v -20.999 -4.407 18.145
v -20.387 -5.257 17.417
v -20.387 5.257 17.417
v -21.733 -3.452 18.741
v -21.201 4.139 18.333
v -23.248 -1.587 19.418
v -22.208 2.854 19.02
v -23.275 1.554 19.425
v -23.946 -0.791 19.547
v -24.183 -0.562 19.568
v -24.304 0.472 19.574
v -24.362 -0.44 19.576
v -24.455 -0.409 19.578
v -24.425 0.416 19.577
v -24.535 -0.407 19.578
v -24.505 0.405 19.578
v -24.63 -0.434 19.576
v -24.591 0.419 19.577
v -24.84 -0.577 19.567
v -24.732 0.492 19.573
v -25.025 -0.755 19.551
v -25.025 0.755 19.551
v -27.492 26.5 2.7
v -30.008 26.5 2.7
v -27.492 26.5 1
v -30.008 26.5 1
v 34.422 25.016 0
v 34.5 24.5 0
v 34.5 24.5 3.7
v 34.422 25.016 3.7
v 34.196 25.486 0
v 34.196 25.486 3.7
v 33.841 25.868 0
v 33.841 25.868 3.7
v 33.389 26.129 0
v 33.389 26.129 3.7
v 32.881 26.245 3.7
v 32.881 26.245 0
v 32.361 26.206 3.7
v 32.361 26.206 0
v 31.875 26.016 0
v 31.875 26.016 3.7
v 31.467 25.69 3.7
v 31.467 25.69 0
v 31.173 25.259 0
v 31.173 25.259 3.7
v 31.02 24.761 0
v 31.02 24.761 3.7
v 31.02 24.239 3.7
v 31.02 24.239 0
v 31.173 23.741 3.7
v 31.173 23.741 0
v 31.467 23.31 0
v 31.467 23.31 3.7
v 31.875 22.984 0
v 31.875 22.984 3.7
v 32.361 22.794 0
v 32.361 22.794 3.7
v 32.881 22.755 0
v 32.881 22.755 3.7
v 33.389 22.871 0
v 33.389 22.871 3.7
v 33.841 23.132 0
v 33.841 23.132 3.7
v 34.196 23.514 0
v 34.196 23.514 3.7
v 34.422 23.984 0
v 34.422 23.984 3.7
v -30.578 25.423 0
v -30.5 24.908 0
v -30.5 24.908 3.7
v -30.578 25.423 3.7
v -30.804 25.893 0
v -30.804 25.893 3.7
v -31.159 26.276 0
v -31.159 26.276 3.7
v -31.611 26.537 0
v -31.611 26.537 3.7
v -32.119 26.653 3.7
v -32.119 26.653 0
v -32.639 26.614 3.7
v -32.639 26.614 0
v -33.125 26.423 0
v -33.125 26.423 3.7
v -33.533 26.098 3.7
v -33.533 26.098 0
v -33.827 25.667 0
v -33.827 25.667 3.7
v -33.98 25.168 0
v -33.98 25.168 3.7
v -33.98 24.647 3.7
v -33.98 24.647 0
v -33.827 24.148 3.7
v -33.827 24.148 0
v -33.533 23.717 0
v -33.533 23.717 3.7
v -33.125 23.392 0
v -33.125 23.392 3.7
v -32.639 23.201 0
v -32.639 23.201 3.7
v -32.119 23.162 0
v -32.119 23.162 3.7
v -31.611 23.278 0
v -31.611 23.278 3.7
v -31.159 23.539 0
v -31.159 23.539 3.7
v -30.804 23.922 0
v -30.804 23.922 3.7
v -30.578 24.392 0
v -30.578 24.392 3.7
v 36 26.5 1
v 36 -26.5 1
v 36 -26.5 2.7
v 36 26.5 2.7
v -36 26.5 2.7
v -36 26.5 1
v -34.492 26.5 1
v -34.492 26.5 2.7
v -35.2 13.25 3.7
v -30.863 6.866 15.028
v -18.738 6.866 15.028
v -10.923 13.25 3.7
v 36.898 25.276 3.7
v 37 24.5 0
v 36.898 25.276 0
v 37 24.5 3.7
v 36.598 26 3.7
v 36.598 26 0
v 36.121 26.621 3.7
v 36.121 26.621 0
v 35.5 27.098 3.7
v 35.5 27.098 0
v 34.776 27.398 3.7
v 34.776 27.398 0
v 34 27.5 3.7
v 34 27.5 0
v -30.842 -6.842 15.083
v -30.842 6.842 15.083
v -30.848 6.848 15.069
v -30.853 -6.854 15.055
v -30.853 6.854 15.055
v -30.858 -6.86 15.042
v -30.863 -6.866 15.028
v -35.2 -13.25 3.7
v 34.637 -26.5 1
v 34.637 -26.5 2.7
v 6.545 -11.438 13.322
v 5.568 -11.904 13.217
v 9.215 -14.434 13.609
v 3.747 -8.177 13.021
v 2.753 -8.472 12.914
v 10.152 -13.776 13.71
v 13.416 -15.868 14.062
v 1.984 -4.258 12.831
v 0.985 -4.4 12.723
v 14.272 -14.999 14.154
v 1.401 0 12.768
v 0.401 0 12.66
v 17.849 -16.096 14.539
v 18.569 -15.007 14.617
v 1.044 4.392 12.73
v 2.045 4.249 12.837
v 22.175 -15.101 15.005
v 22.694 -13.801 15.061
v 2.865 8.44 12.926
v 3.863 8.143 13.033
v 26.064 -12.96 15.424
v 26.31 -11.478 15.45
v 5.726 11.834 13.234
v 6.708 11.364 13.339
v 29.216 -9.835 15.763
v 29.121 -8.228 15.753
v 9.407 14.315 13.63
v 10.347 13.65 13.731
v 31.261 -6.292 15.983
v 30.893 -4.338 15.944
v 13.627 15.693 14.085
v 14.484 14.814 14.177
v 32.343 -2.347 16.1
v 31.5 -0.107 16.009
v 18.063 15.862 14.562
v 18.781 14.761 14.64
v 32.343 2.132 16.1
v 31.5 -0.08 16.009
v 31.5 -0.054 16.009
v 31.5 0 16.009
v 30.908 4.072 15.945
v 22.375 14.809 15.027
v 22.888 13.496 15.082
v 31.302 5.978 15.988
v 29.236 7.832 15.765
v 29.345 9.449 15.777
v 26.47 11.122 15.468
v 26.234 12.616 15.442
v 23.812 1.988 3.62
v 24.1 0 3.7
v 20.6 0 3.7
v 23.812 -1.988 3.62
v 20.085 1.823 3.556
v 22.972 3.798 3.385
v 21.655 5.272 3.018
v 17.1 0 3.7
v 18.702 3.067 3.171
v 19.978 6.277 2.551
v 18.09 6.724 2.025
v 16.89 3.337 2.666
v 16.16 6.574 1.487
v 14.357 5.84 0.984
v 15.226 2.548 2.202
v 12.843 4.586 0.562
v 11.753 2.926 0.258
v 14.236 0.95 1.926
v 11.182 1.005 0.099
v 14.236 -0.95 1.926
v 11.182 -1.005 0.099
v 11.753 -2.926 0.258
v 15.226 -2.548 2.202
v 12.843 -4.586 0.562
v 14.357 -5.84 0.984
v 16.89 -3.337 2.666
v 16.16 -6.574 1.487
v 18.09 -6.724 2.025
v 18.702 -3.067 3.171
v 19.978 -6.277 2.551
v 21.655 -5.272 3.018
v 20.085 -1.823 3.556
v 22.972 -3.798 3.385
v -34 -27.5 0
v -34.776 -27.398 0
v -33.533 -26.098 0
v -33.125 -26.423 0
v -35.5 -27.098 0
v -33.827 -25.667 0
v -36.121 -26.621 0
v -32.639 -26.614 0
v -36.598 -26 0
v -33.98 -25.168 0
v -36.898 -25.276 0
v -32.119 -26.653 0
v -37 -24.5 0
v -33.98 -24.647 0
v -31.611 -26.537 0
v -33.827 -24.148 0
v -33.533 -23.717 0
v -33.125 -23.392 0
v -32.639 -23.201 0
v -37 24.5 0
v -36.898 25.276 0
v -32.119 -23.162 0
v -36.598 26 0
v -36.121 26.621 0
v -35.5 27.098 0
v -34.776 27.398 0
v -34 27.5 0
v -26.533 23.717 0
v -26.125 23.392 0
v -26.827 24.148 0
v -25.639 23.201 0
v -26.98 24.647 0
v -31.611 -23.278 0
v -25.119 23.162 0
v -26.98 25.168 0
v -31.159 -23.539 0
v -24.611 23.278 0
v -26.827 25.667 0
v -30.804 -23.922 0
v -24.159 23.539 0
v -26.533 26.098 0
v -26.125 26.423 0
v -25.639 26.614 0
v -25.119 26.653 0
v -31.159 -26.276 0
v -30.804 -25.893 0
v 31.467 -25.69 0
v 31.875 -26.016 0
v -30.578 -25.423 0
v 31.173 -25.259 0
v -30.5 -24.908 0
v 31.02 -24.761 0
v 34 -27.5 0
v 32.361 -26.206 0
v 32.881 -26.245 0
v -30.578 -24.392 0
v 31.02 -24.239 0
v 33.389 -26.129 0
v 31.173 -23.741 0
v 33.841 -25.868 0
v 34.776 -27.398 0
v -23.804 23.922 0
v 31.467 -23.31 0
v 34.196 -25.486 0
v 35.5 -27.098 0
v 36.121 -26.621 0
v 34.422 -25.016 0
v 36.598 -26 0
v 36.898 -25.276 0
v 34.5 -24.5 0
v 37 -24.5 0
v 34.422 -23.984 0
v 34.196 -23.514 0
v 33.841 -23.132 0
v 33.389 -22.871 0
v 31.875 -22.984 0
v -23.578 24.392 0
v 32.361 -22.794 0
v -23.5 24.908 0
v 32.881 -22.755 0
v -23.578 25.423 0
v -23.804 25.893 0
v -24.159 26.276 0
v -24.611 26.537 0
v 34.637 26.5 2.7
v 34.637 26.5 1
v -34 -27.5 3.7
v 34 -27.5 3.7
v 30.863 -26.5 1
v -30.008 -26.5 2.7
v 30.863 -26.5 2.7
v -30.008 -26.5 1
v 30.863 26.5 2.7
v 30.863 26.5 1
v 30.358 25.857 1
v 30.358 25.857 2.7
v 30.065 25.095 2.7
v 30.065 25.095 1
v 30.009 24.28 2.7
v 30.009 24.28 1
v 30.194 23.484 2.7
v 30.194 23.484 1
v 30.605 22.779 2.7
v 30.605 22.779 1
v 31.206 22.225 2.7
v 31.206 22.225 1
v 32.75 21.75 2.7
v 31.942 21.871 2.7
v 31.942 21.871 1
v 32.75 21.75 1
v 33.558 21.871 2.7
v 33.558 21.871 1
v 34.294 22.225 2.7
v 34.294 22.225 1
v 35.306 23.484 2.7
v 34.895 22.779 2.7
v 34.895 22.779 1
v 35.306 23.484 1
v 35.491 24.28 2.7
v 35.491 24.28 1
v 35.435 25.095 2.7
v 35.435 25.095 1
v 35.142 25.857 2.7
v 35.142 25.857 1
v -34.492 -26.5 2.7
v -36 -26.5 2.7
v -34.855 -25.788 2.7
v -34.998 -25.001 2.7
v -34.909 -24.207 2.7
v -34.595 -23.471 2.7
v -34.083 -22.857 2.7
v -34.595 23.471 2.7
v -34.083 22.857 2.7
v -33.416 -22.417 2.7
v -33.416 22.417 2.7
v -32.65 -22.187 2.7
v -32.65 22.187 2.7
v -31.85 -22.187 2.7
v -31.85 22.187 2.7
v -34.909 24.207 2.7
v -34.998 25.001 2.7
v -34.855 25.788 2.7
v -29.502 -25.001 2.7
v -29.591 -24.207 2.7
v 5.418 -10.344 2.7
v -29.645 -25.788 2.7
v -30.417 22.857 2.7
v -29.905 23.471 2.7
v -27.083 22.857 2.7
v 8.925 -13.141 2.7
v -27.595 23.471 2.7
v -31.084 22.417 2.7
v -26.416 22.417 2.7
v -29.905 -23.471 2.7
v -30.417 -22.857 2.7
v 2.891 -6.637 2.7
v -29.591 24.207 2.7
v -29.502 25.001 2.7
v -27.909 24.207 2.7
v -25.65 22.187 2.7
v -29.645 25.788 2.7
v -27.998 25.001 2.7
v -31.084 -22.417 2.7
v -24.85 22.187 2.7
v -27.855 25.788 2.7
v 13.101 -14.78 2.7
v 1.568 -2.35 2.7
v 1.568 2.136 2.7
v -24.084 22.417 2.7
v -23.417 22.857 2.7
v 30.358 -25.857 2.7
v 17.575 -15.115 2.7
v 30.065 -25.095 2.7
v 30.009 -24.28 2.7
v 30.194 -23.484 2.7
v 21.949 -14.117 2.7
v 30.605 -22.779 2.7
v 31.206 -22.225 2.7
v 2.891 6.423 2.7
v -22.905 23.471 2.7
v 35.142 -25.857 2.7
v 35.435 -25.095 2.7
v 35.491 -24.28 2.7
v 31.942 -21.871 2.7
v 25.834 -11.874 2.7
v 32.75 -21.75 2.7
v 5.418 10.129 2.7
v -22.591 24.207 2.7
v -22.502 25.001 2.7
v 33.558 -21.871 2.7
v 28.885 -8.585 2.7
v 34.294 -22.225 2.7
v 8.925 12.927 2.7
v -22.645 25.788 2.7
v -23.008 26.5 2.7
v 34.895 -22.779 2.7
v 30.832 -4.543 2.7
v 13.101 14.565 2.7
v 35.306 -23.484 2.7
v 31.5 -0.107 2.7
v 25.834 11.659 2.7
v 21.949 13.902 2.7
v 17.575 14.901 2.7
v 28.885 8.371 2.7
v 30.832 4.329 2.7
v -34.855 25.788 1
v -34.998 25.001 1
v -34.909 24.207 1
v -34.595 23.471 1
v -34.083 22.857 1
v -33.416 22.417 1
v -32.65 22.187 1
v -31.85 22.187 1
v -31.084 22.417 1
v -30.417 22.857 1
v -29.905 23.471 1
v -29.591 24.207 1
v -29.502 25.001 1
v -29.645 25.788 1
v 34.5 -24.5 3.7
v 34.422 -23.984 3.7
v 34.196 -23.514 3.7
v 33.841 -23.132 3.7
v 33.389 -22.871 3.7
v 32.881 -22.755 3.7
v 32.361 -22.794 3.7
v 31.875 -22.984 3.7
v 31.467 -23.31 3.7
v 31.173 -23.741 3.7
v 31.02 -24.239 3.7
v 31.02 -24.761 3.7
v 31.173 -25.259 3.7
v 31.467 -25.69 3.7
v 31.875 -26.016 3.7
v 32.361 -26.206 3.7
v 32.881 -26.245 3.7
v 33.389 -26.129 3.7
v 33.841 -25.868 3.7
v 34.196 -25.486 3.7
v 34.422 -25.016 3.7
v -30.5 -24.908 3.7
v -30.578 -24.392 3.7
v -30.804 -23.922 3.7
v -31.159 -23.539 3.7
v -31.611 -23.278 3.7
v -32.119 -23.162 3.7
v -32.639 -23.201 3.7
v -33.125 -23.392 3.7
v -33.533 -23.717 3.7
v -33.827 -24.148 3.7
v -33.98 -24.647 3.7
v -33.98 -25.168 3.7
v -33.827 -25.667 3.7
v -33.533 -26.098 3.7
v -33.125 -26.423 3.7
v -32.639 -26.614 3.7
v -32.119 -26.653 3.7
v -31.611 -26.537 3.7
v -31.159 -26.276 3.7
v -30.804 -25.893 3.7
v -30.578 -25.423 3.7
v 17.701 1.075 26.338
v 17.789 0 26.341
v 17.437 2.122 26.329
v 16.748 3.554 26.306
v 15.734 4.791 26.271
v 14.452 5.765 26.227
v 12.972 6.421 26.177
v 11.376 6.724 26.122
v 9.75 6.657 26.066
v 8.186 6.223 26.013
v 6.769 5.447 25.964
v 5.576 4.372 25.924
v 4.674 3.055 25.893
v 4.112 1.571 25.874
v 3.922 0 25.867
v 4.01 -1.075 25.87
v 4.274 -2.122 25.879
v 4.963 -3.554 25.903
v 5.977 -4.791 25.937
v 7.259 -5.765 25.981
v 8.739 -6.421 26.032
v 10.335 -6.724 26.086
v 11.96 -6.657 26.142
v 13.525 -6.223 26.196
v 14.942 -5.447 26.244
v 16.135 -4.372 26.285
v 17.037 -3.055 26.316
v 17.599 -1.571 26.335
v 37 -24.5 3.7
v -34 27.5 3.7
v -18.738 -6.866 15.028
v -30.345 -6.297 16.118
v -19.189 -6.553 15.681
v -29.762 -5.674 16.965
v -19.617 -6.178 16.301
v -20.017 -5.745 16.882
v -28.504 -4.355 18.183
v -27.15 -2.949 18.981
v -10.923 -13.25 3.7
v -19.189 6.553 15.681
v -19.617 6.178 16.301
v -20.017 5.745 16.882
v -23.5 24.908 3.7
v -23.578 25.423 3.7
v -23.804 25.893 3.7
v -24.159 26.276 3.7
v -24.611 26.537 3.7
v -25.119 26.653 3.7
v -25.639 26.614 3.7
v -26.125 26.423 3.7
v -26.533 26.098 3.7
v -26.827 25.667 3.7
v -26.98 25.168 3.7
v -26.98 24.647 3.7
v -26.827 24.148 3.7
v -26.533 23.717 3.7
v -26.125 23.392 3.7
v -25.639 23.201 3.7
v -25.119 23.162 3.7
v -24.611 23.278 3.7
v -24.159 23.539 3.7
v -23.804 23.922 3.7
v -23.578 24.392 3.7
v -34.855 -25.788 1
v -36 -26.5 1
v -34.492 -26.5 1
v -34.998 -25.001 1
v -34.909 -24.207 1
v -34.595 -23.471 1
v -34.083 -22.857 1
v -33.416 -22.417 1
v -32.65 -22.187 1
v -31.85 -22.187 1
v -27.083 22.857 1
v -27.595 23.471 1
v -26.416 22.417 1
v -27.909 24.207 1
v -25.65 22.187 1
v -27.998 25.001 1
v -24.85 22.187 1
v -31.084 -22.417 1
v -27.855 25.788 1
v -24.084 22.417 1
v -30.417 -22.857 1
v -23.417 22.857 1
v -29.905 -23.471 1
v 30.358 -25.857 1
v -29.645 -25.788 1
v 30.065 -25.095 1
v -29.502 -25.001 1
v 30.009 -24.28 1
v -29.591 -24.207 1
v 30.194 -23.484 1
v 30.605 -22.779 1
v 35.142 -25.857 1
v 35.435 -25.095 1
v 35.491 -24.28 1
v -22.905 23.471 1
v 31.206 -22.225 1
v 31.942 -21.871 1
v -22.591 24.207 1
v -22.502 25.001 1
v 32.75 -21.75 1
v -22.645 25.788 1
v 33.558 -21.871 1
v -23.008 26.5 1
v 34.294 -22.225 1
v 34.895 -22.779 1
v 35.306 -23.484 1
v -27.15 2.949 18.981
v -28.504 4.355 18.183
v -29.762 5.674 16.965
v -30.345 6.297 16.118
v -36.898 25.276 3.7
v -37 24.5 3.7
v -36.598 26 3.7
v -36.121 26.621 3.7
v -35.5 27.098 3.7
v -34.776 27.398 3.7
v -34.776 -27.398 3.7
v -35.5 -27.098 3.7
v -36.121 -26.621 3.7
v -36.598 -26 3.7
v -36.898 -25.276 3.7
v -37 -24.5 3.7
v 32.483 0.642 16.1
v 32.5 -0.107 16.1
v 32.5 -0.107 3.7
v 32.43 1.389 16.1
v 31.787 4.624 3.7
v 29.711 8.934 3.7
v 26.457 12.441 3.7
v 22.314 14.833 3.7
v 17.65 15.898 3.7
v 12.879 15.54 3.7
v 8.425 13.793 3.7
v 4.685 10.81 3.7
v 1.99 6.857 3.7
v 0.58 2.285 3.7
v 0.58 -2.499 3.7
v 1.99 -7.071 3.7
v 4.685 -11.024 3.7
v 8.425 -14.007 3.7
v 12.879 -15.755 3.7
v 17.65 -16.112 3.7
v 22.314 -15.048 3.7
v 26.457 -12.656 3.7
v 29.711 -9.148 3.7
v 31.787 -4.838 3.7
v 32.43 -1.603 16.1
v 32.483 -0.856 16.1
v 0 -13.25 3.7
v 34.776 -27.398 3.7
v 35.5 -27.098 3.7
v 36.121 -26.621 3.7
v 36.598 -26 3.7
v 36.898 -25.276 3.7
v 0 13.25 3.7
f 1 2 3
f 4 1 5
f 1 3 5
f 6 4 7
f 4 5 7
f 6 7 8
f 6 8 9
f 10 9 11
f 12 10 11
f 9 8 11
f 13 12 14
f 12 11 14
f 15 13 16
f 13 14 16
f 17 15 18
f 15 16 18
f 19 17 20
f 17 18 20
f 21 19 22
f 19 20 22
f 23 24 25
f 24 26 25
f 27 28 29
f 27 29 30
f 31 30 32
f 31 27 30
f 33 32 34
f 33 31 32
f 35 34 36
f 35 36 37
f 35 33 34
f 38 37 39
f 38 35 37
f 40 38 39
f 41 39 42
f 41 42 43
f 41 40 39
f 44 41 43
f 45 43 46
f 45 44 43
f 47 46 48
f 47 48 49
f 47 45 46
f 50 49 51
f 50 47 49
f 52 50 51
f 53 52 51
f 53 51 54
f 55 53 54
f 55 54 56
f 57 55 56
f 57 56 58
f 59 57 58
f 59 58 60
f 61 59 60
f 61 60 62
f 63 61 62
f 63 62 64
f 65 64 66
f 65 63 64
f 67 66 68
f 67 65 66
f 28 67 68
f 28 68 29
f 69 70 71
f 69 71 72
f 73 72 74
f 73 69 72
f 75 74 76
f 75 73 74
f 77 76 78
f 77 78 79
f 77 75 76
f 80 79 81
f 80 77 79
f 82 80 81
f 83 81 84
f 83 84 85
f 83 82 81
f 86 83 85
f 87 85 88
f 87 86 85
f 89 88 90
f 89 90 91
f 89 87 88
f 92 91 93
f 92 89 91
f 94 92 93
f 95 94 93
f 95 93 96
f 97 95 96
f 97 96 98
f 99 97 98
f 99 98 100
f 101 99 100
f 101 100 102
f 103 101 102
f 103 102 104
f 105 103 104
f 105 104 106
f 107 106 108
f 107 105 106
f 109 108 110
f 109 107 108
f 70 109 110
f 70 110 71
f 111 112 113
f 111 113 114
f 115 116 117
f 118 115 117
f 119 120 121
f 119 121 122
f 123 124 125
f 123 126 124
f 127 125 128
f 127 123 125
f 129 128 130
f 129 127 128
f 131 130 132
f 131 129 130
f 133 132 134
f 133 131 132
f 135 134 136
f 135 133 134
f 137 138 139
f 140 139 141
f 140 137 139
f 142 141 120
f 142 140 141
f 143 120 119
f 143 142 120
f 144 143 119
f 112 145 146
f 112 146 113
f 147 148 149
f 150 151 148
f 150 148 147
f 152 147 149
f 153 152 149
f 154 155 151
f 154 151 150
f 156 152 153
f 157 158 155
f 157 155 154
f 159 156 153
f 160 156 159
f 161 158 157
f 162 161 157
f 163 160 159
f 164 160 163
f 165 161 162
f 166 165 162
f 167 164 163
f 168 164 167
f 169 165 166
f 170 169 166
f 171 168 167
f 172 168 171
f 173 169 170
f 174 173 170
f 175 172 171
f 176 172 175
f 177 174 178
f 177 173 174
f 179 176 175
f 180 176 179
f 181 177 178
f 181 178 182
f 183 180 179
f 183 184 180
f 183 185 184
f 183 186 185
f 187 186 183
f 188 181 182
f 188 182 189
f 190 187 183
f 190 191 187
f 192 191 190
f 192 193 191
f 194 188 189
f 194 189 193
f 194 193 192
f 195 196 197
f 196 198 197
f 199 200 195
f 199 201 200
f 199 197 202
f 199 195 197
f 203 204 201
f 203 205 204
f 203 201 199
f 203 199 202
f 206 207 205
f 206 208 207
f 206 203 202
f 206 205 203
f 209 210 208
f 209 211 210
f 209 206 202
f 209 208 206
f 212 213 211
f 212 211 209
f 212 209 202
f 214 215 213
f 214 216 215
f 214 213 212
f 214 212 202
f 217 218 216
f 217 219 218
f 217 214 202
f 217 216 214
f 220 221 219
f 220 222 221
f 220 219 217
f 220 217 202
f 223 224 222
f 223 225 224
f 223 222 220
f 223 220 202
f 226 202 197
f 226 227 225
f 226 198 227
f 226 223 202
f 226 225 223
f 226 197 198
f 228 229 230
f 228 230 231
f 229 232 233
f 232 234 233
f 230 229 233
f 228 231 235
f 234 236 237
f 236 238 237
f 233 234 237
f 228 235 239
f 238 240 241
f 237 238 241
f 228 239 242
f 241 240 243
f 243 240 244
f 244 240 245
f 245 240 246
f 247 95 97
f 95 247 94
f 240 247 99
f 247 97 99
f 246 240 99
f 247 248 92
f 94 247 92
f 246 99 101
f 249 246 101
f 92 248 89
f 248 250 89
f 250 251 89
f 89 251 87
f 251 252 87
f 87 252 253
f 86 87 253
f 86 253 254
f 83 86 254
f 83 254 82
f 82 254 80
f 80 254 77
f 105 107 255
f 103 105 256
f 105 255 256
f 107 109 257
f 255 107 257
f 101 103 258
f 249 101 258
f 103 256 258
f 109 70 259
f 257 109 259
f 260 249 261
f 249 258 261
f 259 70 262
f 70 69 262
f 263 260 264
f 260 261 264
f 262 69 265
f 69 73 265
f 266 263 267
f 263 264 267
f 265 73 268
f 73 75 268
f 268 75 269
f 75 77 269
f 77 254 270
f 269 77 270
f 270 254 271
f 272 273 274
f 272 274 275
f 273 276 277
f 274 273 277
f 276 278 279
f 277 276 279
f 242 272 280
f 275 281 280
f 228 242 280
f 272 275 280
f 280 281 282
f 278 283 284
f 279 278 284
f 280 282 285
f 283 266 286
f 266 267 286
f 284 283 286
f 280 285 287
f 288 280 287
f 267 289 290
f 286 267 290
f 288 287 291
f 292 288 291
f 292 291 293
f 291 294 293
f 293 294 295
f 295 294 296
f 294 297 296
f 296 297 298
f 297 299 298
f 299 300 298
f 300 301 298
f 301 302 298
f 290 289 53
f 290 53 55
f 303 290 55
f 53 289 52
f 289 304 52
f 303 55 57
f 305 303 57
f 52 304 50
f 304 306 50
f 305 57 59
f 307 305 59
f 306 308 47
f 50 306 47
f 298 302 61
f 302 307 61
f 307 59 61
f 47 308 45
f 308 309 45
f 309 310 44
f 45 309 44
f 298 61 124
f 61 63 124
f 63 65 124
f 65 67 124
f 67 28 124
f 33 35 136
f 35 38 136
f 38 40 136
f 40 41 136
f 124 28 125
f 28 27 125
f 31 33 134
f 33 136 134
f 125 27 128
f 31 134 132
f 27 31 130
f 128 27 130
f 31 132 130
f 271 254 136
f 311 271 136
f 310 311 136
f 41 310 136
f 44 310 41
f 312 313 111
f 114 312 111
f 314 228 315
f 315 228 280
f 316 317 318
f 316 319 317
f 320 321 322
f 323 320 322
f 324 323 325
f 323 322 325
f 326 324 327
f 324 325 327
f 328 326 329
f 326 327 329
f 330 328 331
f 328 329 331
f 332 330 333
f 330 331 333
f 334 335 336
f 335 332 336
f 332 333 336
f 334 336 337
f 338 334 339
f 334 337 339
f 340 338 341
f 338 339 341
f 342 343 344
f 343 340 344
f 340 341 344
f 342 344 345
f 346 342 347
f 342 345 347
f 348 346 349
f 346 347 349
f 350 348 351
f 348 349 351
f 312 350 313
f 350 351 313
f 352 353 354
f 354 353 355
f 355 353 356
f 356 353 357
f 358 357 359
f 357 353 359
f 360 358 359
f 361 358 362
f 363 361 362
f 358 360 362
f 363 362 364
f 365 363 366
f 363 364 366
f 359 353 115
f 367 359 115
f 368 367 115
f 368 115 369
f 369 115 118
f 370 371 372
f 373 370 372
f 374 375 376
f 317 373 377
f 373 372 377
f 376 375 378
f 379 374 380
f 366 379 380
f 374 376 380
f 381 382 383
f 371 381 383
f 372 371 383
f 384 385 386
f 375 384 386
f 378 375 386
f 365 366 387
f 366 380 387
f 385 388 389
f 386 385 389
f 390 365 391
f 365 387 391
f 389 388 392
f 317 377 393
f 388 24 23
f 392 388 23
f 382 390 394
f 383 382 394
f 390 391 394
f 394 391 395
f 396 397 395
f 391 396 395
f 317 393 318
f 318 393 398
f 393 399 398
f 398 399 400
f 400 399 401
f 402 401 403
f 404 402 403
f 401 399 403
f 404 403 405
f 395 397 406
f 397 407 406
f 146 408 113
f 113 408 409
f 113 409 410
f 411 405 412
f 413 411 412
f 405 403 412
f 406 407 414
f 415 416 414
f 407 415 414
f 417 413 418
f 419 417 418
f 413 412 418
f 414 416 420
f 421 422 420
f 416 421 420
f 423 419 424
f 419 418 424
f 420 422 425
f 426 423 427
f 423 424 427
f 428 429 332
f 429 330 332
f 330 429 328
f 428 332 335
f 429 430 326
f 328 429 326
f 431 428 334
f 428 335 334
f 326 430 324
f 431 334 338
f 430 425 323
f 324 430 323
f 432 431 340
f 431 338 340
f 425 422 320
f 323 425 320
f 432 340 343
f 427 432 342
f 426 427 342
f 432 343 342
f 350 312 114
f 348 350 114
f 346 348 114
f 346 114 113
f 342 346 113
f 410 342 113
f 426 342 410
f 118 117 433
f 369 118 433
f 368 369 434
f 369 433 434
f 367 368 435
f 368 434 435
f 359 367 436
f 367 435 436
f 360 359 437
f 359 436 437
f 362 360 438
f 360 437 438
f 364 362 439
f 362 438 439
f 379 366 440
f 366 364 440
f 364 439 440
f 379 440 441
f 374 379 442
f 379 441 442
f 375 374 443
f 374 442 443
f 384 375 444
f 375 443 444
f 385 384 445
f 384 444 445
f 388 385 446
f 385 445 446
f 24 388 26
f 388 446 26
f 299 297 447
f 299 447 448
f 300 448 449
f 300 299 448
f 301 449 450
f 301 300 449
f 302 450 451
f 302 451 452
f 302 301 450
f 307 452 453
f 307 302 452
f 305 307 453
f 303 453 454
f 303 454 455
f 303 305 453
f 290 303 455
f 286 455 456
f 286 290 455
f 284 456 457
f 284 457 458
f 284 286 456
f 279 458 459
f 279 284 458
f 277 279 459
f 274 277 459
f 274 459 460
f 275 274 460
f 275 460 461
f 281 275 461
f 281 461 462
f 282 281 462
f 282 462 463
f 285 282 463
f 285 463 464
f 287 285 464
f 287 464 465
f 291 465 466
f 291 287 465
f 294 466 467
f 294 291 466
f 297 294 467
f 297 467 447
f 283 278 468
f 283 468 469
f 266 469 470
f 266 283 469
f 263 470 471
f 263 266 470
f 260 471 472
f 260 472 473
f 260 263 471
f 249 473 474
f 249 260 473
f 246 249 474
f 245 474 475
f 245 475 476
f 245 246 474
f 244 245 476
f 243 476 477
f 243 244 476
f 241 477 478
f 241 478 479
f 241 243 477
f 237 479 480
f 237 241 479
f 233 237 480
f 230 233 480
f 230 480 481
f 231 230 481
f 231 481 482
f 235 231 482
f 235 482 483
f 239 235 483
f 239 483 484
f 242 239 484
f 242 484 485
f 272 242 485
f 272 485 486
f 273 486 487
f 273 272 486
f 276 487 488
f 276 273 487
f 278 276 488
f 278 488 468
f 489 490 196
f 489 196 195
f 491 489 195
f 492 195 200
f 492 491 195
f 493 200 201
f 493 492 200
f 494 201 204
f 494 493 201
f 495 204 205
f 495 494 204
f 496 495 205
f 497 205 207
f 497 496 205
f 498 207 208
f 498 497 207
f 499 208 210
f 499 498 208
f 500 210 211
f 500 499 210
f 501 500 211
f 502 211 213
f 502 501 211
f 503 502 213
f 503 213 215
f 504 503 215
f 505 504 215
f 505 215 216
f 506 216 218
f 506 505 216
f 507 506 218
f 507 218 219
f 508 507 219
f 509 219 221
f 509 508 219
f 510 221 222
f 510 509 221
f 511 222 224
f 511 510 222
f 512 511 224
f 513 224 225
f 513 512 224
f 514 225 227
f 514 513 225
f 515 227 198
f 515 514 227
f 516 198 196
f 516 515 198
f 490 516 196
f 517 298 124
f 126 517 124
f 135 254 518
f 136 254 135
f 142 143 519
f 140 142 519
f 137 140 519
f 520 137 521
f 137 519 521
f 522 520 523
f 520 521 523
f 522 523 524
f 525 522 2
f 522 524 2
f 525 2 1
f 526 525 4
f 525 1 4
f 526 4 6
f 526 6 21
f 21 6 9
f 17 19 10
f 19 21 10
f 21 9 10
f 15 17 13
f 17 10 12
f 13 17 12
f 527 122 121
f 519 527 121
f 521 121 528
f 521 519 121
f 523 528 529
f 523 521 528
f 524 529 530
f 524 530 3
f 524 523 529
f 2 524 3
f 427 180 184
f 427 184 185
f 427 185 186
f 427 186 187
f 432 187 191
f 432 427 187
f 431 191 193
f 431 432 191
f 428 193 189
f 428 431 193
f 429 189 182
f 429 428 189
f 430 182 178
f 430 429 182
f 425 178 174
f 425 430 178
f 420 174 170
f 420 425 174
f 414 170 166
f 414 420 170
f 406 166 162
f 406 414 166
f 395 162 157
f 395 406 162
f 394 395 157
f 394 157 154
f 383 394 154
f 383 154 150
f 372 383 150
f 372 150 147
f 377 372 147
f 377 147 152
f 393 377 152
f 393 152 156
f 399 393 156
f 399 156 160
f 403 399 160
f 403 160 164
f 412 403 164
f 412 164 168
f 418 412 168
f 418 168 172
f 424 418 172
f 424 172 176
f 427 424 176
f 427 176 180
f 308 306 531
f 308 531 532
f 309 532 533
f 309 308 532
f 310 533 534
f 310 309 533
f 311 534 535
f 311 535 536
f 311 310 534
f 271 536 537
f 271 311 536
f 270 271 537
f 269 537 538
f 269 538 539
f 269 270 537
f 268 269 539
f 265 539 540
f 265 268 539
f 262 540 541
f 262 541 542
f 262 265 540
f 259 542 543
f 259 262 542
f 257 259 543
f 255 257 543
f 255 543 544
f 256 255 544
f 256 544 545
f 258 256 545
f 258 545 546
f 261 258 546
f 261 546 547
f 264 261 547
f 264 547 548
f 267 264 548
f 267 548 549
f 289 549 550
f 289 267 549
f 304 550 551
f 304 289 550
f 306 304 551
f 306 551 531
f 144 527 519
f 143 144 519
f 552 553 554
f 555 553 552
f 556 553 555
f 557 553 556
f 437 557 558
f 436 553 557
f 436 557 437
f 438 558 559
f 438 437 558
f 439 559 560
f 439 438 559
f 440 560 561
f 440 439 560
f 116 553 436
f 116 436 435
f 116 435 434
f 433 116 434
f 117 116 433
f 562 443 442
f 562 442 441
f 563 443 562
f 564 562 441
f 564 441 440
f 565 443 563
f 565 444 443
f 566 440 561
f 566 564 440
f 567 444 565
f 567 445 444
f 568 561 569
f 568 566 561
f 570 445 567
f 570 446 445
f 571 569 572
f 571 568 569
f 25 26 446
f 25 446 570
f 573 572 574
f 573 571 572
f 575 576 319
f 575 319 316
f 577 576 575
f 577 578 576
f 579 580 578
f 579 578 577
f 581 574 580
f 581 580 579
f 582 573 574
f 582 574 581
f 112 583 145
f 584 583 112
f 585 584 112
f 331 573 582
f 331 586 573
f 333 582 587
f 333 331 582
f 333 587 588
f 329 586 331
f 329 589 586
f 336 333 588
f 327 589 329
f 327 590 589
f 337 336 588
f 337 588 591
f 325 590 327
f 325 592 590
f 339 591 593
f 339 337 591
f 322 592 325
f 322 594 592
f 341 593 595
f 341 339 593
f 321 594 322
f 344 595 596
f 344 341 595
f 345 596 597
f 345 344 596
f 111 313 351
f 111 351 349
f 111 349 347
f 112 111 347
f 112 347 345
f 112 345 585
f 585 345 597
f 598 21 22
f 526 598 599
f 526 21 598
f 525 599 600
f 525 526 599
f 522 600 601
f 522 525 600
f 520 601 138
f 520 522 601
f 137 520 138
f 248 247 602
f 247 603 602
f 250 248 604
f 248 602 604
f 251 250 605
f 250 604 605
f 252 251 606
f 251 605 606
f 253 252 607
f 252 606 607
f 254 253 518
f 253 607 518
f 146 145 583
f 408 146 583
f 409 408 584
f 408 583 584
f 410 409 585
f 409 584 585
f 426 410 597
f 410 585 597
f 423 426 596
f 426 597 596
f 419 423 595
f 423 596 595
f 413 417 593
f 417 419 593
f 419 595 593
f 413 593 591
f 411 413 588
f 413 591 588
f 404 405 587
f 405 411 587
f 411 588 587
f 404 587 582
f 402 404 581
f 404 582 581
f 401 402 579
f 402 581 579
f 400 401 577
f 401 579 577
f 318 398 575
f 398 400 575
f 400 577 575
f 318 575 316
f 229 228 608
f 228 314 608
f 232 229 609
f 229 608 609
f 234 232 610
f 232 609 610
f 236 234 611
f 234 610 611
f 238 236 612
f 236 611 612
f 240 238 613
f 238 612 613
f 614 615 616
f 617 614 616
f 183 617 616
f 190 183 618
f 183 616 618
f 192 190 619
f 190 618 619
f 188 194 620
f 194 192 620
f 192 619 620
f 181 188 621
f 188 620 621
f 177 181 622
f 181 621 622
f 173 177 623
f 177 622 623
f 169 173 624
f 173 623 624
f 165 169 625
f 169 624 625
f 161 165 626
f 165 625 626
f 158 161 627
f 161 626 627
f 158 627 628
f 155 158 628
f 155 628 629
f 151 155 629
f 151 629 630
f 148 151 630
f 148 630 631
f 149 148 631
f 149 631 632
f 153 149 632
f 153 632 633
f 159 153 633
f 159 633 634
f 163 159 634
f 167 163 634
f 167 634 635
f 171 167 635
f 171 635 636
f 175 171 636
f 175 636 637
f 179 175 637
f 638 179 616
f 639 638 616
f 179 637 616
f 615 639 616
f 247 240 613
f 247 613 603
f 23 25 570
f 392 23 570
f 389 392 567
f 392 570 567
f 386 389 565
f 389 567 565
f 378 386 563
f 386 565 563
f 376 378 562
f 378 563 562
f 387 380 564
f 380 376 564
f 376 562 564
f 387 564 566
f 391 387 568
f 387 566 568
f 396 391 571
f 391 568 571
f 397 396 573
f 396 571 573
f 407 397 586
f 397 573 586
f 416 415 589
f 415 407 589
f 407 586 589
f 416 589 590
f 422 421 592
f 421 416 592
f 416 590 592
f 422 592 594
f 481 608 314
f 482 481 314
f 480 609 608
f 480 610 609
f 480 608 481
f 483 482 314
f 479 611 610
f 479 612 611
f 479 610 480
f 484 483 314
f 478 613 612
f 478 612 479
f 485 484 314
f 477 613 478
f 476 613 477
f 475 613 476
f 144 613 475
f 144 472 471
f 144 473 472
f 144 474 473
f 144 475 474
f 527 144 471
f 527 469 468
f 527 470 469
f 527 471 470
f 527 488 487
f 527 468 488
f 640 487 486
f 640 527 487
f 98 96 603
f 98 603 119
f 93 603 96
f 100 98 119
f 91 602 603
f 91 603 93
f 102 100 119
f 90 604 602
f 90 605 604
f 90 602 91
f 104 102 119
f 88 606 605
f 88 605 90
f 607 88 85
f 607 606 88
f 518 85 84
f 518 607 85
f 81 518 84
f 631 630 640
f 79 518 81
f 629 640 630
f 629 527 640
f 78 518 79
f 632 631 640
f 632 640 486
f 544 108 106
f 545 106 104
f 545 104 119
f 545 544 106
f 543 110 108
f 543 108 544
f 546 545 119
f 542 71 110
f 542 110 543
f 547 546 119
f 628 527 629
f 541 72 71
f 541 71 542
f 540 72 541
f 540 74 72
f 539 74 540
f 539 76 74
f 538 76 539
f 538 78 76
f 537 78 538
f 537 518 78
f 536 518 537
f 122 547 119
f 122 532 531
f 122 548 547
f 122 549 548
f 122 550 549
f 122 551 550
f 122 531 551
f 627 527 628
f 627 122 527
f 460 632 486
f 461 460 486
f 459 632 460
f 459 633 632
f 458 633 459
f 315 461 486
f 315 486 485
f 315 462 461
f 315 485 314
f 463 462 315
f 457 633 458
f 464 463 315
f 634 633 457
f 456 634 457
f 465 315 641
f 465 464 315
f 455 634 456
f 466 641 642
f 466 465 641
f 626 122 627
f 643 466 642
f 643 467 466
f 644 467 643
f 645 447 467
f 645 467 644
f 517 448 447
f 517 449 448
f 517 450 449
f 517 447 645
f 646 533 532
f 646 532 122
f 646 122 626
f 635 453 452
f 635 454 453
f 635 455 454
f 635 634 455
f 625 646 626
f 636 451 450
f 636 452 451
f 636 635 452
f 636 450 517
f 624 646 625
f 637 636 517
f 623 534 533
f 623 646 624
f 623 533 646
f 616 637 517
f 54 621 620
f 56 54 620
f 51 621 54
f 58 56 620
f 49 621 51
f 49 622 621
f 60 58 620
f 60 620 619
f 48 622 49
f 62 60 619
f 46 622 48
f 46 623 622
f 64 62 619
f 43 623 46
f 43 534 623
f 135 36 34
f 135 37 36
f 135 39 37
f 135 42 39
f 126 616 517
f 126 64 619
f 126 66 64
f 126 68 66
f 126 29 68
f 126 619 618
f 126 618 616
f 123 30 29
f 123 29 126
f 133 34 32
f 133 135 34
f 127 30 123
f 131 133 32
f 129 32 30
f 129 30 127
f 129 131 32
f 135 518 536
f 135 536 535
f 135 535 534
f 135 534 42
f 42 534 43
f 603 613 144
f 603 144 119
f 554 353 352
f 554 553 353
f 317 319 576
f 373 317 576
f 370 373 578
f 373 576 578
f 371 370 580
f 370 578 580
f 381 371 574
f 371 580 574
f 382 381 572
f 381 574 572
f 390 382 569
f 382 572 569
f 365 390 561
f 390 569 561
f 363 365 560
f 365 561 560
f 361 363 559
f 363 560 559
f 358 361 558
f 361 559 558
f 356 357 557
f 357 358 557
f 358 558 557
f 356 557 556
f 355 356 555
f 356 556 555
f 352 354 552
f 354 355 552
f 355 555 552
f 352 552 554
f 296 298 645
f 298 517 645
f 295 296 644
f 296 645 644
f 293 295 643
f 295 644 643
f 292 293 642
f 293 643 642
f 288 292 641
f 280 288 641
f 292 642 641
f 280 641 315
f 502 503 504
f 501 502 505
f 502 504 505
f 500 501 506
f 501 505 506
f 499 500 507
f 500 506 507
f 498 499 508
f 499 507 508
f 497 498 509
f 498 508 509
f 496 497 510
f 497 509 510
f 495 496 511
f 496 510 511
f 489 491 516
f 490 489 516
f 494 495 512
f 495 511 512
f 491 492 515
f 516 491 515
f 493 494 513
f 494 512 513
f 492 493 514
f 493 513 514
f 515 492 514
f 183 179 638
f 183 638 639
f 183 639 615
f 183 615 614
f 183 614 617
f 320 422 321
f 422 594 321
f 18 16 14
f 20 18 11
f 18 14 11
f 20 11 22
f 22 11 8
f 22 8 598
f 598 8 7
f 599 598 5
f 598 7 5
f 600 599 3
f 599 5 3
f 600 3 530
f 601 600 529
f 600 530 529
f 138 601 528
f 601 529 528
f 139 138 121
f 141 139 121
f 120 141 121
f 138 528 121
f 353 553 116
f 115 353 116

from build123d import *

# Parameters (mm, degrees)
F0_W          = 74
F0_H          = 55
F0_R          = 1.75
F0_R_2        = 16.05
F0_W_2        = 30
F0_H_2        = 26
F1_DEPTH      = 3.7
F2_DEPTH      = 16.1
F3_T          = -1
F4_R          = 3
F5_R          = 3
F6_R          = 3
F8_DEPTH      = 25
F8_DEPTH_BACK = 25
F10_DEPTH     = 13.25
F12_DEPTH     = 45
F13_T1_DEPTH  = 23.7483217569
F14_R         = 1.75
F15_DEPTH     = 104
F19_DEPTH     = 12.5


# Not quite as in the source:
# - a fillet or chamfer that OpenCascade refuses, or shapes differently, is made with other operations: its cross-section is extruded or revolved along the edge and cut away or added
# - an extrude ends at something that could not be found from the text; its depth is read off the source's solid


with BuildPart() as f1:
    # F0 (on Top) → F1 (new body)
    with BuildSketch(Plane.XY):
        Rectangle(F0_W, F0_H)
        with Locations((-32.25, -24.9075)):
            Circle(F0_R, mode=Mode.SUBTRACT)
        with Locations((32.75, -24.5)):
            Circle(F0_R, mode=Mode.SUBTRACT)
        with Locations((16.4502794727, -0.1071739239)):
            Circle(F0_R_2, mode=Mode.SUBTRACT)
        with Locations((-20.85, 0)):
            Rectangle(F0_W_2, F0_H_2, mode=Mode.SUBTRACT)
        with Locations((-32.25, 24.9075)):
            Circle(F0_R, mode=Mode.SUBTRACT)
        with Locations((-25.25, 24.9075)):
            Circle(F0_R, mode=Mode.SUBTRACT)
        with Locations((32.75, 24.5)):
            Circle(F0_R, mode=Mode.SUBTRACT)
        with Locations((16.4502794727, -0.1071739239)):
            Circle(F0_R_2)
        with Locations((-20.85, 0)):
            Rectangle(F0_W_2, F0_H_2)
    extrude(amount=F1_DEPTH)

    # F0 (on Top) → F2 (join)
    with BuildSketch(Plane.XY):
        with Locations((16.4502794727, -0.1071739239)):
            Circle(F0_R_2)
    extrude(amount=F2_DEPTH)

    # F3
    f3_openings = [f1.faces().sort_by_distance(p)[0] for p in [
        (16.450279, -0.107174, 16.1),
    ]]
    offset(amount=F3_T, openings=f3_openings, kind=Kind.INTERSECTION)

    # F4
    f4_edges = [f1.edges().sort_by_distance(p)[0] for p in [
        (37, -27.5, 1.85),
    ]]
    fillet(f4_edges, radius=F4_R)

    # F5
    f5_edges = [f1.edges().sort_by_distance(p)[0] for p in [
        (-37, -27.5, 1.85),
    ]]
    fillet(f5_edges, radius=F5_R)

    # F6
    f6_edges = [f1.edges().sort_by_distance(p)[0] for p in [
        (37, 27.5, 1.85),
        (-37, 27.5, 1.85),
    ]]
    fillet(f6_edges, radius=F6_R)

    # F7 (on Front) → F8 (cut, two sides)
    with BuildSketch(Plane.XZ) as f8_sk:
        Polygon((0.28697688, 12.6480264865), (32.789242817, 16.1480264865), (0.28697688, 16.1480264865), align=None)
    extrude(amount=-F8_DEPTH, mode=Mode.SUBTRACT)
    extrude(f8_sk.sketch, amount=F8_DEPTH_BACK, mode=Mode.SUBTRACT)

    # F9 (on Front) → F10 (join, symmetric)
    with BuildSketch(Plane.XZ):
        with BuildLine():
            Line((-35.2, 3.7), (-34, 3.7))
            Line((-34, 3.7), (-10.9234992415, 3.7))
            Line((-10.9234992415, 3.7), (-21.4788466692, 19))
            ThreePointArc((-21.4788466692, 19), (-26.9989833996, 19.0456914763), (-30.8422791347, 15.082980898))
            Line((-30.8422791347, 15.082980898), (-35.2, 3.7))
        make_face()
    extrude(amount=F10_DEPTH, both=True)

    # F11 (on Right) → F12 (cut)
    with BuildSketch(Plane.YZ):
        with BuildLine():
            ThreePointArc((-6.8658292344, 15.0277878828), (-4.1214232588, 18.344788865), (0, 19.5890275867))
            Line((0, 19.5890275867), (-13.25, 19.5890275867))
            Line((-13.25, 19.5890275867), (-13.25, 15.082980898))
            Line((-13.25, 15.082980898), (-13.25, 3.7))
            Line((-13.25, 3.7), (-6.8658292344, 15.0277878828))
        make_face()
        with BuildLine():
            Line((13.25, 3.7), (13.25, 15.082980898))
            Line((13.25, 15.082980898), (13.25, 19.5890275867))
            Line((13.25, 19.5890275867), (0, 19.5890275867))
            ThreePointArc((0, 19.5890275867), (4.1214232588, 18.344788865), (6.8658292344, 15.0277878828))
            Line((6.8658292344, 15.0277878828), (13.25, 3.7))
        make_face()
    extrude(amount=-F12_DEPTH, mode=Mode.SUBTRACT)

    # F13: fillet of radius 5 on 1 edges, made by hand

    # F13_s2 → F13_t1 (cut)
    with BuildSketch(Plane.XZ.offset(-11.8741608785)):
        with BuildLine():
            ThreePointArc((-20.3869820489, 17.4173397602), (-22.4131252415, 19.1204957059), (-25.0248198534, 19.5506673765))
            ThreePointArc((-25.0248198534, 19.5506673765), (-23.2160189055, 19.5059570206), (-21.4788466692, 19))
            Line((-21.4788466692, 19), (-20.3869820489, 17.4173397602))
        make_face()
    extrude(amount=F13_T1_DEPTH, mode=Mode.SUBTRACT)

    # F14 (on Top) → F15 (cut, through all)
    with BuildSketch(Plane.XY):
        with Locations((-32.25, 24.9075)):
            Circle(F14_R)
        with Locations((-25.25, 24.9075)):
            Circle(F14_R)
    extrude(amount=-F15_DEPTH, mode=Mode.SUBTRACT)


with BuildPart() as f17:
    # F16 (on Front) → F17 (revolve)
    with BuildSketch(Plane.XZ):
        Polygon((9.7785348499, 29.9677548091), (17.1002794727, 3.7), (24.1002794727, 3.7), (16.7785348499, 29.9677548091), align=None)
    revolve(axis=Axis((13.4394071613, 0, 16.8338774046), (-0.2684998475, 0, 0.9632797267)))

    # F18 (on Front) → F19 (cut, symmetric)
    with BuildSketch(Plane.XZ):
        Polygon((0.2809657395, 25.7425316266), (3.921539106, 25.8670715578), (17.7893069679, 26.3414723408), (18.2282145804, 32.3491258427), (4.9899508543, 32.7628237839), (2.055067569, 32.8836254776), align=None)
    extrude(amount=F19_DEPTH, both=True, mode=Mode.SUBTRACT)


solid = Compound([f1.part, f17.part])
